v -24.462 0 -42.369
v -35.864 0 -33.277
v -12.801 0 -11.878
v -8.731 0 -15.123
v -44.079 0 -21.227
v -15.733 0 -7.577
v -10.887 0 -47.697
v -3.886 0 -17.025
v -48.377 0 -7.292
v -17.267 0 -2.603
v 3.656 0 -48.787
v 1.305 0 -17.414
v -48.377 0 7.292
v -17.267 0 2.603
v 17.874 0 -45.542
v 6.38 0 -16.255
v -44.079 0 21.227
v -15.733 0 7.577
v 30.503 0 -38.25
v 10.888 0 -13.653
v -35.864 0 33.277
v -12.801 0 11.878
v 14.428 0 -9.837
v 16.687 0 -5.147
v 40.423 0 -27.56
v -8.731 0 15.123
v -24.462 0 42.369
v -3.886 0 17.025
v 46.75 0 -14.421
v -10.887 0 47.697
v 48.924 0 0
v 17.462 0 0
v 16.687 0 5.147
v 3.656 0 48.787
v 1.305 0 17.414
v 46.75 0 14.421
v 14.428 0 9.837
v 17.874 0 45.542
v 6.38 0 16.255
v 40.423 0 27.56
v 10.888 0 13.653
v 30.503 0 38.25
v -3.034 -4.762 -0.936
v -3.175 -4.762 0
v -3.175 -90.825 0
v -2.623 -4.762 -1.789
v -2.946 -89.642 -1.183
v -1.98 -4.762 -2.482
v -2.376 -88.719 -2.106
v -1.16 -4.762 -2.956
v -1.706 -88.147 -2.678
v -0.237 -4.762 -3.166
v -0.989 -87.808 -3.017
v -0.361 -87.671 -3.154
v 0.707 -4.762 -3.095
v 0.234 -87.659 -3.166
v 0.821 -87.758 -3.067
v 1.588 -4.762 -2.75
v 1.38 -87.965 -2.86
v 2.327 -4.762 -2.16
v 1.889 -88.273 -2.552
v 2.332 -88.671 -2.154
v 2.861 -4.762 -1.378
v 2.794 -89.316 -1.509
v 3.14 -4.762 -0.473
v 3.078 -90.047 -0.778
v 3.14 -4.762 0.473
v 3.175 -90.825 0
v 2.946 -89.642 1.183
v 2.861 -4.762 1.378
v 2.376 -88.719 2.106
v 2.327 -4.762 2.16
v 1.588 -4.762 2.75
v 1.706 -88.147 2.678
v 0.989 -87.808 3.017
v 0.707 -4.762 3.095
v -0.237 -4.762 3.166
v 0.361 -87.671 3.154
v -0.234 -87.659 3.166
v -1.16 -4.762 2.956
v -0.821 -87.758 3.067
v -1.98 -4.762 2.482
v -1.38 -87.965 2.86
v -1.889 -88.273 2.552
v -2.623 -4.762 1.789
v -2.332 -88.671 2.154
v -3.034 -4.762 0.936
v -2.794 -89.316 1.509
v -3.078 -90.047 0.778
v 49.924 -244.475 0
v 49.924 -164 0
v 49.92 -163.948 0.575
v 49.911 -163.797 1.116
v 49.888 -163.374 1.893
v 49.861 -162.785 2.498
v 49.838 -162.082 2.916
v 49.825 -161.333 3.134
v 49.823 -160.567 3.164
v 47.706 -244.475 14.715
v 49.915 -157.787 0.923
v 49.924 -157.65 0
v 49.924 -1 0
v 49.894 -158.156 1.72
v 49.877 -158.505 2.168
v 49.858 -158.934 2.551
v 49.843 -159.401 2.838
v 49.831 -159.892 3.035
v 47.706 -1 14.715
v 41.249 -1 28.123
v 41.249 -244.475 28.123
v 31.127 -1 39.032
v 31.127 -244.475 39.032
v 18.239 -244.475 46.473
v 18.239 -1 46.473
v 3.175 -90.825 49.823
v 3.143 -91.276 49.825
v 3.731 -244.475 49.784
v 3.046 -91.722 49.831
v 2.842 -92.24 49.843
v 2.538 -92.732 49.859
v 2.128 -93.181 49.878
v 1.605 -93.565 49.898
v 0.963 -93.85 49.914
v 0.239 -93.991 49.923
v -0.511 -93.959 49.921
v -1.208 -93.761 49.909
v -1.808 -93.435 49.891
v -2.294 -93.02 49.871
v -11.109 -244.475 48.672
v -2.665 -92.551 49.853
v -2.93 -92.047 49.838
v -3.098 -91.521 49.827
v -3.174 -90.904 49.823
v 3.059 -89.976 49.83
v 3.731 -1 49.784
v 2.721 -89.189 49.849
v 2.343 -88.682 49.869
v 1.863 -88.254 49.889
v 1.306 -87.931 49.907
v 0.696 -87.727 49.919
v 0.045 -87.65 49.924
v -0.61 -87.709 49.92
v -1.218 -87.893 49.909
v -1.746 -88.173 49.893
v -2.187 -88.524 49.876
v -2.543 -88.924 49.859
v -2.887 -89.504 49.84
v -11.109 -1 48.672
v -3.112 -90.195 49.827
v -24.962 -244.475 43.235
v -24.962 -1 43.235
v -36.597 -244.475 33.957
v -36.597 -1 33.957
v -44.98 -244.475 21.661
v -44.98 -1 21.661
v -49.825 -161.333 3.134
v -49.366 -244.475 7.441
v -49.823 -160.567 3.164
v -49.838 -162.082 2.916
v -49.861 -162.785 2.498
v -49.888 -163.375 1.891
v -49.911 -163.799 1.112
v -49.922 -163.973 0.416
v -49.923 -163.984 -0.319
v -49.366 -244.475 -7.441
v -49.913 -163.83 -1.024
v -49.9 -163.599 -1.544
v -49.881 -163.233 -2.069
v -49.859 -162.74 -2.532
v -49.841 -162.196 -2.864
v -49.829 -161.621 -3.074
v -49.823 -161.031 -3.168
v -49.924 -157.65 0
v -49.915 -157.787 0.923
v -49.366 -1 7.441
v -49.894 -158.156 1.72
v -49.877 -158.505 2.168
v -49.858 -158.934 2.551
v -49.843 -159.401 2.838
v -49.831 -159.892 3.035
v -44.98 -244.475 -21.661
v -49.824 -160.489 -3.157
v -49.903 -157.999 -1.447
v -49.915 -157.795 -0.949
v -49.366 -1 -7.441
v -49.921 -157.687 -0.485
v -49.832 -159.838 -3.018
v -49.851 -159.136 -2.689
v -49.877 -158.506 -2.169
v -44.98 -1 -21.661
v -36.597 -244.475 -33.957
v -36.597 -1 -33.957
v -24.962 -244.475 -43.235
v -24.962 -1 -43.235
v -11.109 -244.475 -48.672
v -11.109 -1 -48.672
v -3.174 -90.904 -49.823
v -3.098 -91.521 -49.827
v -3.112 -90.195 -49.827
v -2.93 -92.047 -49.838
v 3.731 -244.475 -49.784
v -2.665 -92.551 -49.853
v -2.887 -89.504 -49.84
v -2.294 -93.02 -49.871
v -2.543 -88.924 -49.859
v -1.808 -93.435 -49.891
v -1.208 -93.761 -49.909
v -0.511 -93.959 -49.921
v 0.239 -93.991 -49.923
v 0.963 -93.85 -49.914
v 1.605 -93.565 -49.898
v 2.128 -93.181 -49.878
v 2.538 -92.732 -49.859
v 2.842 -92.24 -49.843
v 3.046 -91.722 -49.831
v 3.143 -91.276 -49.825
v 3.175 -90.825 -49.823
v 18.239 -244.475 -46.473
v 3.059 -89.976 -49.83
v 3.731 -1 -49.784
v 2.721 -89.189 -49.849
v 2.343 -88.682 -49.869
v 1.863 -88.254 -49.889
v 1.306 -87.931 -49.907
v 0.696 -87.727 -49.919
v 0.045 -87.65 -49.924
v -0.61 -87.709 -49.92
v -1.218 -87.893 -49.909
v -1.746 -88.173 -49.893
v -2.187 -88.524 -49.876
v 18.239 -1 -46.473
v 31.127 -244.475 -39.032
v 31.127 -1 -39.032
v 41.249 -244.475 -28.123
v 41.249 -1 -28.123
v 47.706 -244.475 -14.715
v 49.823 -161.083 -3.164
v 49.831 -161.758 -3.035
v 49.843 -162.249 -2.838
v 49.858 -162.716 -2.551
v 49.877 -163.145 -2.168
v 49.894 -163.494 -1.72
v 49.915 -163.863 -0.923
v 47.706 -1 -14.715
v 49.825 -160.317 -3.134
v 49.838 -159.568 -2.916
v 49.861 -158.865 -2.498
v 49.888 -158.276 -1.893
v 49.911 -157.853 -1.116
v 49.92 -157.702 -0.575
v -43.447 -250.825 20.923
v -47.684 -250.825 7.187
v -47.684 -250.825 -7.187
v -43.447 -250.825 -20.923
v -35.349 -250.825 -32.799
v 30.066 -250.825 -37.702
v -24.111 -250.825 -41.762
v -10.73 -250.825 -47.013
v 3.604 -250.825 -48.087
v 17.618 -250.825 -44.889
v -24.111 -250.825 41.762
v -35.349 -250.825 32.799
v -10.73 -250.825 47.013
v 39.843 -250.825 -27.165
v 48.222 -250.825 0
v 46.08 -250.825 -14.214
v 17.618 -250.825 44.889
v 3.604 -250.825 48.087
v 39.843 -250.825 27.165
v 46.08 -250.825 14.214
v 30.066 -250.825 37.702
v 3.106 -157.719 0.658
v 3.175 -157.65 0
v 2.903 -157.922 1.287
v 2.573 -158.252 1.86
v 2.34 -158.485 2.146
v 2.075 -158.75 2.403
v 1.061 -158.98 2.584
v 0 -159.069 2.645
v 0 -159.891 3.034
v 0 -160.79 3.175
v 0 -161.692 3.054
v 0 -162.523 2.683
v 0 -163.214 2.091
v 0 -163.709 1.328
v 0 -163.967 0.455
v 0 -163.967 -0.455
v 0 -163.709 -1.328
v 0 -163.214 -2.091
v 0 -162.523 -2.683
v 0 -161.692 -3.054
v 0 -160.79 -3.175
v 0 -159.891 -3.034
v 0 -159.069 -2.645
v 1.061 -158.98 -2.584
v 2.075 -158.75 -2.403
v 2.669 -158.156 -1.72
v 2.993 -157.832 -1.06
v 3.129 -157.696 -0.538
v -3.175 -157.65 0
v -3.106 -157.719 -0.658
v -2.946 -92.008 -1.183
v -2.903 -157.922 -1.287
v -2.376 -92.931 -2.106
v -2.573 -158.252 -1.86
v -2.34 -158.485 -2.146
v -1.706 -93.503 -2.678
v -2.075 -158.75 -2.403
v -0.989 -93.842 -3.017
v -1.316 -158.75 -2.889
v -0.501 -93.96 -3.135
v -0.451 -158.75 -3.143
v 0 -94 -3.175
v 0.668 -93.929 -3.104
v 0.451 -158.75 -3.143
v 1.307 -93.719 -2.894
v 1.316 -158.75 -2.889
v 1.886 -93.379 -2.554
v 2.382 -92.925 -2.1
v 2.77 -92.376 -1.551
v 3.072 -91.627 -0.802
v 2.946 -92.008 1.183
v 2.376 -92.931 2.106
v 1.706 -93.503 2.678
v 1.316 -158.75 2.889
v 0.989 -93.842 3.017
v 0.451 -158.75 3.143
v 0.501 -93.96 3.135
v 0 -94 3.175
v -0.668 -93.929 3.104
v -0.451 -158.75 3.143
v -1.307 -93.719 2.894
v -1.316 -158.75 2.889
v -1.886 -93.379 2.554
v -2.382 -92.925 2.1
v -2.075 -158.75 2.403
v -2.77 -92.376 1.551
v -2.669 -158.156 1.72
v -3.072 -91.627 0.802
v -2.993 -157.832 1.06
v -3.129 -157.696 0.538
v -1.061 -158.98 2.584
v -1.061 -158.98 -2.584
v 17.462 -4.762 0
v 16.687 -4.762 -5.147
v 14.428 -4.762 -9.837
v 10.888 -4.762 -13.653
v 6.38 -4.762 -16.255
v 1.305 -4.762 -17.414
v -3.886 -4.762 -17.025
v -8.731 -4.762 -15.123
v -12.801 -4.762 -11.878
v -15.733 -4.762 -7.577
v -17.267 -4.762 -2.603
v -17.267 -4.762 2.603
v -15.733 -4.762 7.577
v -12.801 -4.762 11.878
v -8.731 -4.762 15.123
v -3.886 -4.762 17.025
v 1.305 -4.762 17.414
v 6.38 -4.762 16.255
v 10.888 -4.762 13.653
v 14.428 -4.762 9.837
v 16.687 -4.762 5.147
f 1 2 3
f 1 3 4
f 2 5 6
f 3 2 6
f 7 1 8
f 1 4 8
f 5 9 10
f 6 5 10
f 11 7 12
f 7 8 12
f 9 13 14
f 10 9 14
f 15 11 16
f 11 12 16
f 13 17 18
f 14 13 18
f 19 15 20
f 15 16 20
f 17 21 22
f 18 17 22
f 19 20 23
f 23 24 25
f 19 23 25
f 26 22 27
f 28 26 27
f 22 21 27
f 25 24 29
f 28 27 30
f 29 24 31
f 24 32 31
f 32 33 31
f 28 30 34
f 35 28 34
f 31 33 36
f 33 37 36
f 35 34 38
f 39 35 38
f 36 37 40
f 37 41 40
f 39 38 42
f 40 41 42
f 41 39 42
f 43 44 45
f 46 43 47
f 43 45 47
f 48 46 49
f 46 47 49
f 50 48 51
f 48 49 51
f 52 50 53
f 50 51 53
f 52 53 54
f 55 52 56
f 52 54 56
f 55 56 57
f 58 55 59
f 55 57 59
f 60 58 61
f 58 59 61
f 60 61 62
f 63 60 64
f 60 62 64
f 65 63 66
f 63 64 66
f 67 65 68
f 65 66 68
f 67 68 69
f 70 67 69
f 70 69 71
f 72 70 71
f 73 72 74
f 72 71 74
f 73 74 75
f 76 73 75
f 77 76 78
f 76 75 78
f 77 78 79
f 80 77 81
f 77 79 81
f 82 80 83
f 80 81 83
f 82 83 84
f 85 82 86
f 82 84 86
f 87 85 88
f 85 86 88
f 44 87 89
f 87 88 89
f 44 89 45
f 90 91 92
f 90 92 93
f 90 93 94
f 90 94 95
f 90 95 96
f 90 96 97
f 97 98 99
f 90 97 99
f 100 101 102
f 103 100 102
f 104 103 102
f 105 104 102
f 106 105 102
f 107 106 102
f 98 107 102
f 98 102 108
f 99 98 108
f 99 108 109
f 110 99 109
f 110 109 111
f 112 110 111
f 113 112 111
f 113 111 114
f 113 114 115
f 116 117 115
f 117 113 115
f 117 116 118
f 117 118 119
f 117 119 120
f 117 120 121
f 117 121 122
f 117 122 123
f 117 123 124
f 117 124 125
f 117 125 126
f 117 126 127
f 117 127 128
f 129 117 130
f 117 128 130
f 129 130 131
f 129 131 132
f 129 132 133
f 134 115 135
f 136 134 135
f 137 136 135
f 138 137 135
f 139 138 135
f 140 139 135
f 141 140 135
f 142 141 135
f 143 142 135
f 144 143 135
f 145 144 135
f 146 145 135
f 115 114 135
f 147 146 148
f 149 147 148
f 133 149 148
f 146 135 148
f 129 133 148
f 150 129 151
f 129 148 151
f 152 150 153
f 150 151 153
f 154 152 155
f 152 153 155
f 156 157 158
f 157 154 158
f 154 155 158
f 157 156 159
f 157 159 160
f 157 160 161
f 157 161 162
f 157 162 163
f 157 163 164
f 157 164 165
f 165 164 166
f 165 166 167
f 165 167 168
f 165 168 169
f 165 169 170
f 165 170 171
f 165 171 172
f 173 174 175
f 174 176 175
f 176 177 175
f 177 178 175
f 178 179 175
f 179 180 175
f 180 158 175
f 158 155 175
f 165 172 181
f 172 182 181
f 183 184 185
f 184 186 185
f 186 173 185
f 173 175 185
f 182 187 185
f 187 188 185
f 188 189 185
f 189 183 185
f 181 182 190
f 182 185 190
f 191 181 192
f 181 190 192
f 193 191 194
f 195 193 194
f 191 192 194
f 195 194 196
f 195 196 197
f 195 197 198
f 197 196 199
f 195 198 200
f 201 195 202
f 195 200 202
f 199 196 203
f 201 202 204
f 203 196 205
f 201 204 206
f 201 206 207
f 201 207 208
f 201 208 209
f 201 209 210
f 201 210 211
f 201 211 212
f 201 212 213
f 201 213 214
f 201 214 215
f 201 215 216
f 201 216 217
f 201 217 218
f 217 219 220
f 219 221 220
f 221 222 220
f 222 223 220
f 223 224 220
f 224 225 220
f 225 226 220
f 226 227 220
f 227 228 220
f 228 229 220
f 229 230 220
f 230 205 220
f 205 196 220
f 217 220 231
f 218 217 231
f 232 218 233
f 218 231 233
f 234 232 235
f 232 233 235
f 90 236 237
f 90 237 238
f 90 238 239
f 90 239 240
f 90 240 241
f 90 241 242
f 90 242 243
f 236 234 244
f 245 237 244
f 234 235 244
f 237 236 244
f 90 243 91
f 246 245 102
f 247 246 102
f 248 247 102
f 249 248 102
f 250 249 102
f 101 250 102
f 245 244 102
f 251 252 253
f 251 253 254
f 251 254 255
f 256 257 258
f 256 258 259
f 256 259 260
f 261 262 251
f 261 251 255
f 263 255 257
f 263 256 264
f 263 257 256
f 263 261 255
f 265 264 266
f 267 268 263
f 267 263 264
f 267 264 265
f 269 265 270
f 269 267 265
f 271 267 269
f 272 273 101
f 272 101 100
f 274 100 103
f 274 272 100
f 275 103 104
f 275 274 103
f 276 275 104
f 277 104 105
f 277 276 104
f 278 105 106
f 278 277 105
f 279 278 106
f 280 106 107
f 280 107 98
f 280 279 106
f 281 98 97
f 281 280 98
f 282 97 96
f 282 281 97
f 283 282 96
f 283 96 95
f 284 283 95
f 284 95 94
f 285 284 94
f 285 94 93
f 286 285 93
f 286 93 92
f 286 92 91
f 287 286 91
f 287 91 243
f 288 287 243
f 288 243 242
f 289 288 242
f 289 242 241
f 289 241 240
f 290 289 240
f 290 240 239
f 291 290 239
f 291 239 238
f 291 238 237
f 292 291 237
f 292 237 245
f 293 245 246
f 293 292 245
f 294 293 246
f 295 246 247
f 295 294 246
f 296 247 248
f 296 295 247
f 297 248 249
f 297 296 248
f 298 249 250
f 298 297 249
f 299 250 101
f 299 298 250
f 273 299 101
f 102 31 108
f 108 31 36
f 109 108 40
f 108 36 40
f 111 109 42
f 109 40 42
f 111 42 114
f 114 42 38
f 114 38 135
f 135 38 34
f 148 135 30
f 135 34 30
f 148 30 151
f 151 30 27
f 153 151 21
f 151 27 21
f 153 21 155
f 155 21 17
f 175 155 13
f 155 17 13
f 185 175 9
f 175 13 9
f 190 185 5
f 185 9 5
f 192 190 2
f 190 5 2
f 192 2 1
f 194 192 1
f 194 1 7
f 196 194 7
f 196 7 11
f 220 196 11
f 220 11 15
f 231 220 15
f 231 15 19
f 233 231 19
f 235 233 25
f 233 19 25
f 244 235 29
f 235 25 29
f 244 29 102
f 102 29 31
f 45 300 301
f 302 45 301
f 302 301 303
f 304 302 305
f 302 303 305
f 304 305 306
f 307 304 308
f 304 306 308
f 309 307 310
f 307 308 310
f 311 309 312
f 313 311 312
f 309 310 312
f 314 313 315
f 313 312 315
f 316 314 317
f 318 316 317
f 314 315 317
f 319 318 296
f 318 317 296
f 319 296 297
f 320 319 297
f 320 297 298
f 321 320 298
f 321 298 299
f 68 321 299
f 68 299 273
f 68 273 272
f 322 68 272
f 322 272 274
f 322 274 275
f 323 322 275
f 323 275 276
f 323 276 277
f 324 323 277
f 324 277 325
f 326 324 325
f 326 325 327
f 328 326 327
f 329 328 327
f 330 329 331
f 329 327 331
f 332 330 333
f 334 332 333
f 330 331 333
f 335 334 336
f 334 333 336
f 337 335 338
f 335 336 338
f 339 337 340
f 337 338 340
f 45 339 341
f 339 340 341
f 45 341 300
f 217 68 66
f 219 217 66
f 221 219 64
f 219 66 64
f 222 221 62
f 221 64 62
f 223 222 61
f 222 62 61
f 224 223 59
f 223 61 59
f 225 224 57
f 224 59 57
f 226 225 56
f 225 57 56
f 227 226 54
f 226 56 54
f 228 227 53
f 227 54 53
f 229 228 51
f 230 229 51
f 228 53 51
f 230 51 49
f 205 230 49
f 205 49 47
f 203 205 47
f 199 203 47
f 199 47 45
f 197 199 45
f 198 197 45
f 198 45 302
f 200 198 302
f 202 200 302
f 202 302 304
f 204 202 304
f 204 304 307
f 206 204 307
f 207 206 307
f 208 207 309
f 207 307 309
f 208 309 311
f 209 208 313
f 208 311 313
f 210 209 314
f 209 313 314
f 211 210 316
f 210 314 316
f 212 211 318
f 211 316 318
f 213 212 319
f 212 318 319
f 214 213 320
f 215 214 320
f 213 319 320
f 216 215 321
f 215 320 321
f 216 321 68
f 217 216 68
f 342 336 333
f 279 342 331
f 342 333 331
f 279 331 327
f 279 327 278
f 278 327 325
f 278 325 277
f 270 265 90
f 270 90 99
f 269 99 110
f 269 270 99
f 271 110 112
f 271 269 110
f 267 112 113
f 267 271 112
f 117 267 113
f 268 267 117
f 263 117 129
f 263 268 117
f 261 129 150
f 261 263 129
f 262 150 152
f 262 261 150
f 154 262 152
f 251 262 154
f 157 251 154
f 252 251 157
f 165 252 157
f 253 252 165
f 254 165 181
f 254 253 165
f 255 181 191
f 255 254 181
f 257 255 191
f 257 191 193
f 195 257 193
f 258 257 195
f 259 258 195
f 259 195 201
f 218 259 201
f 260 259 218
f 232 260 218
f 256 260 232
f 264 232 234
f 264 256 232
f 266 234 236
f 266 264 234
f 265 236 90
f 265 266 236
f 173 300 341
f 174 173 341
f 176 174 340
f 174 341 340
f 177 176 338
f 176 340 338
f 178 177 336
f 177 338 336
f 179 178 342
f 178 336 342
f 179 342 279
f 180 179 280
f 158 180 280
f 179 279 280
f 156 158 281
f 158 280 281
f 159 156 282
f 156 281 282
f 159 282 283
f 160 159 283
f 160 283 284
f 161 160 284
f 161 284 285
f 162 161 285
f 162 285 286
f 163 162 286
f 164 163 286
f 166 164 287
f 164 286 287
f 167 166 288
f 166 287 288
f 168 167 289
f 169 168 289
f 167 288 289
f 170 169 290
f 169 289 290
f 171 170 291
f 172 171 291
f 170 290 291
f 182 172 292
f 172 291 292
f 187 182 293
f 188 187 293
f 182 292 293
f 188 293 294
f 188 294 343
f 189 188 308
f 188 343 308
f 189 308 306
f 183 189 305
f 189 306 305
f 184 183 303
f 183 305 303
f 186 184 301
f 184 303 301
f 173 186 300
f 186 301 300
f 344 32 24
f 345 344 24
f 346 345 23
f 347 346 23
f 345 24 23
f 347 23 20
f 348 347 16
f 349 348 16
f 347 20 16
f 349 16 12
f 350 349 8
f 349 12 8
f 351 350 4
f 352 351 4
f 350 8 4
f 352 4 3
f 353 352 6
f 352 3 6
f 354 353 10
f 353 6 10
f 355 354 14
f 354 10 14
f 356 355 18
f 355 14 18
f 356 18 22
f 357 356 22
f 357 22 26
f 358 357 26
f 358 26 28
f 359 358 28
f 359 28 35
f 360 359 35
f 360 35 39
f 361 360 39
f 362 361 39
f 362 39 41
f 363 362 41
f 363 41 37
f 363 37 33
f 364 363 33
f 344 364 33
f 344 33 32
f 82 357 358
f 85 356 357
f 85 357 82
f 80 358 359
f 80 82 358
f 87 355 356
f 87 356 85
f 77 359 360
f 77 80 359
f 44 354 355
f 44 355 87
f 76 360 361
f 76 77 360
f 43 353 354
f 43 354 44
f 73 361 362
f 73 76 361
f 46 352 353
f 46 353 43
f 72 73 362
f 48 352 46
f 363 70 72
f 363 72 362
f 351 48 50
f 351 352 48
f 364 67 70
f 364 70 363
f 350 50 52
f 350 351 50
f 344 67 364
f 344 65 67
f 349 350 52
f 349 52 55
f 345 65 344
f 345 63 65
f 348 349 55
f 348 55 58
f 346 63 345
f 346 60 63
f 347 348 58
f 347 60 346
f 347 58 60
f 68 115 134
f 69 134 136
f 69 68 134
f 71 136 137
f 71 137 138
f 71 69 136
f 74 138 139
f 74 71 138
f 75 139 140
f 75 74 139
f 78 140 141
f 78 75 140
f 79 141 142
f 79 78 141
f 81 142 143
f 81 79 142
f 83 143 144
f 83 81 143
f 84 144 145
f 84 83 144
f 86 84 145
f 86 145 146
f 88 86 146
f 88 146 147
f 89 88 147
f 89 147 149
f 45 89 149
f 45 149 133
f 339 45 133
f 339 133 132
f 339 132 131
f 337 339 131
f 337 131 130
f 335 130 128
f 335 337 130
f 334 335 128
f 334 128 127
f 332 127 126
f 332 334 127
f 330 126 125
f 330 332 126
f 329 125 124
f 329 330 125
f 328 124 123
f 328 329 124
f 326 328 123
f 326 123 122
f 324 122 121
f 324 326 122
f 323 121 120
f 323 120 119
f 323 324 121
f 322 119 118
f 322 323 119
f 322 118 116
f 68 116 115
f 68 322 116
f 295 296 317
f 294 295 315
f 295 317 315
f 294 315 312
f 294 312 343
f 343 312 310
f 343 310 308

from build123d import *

# Parameters (mm, degrees)
F0_R           = 49.9237
F1_DEPTH       = 250.825
F2_SIZE2       = 1.7014773719
F2_SIZE        = 6.35
F4_D           = 6.35
F4_DEPTH       = 158.75
F4_CBORE_D     = 34.925
F4_CBORE_DEPTH = 4.7625
F4_TIP         = 1.9077324654
F5_R           = 3.175
F6_DEPTH       = 49.9247
F6_DEPTH_BACK  = 49.9247
F7_R           = 3.175
F8_DEPTH       = 49.9247001
F8_DEPTH_BACK  = 49.9247001
F9_SIZE        = 1


with BuildPart() as f1:
    # F0 (on Front) → F1 (new body)
    with BuildSketch(Plane.XZ):
        Circle(F0_R)
    extrude(amount=F1_DEPTH)

    # F2
    f2_edges = [f1.edges().sort_by_distance(p)[0] for p in [
        (-49.9237, -250.825, 0),
    ]]
    f2_side = f1.faces().sort_by_distance((-49.9237, -125.4125, 0))[0]
    chamfer(f2_edges, length=F2_SIZE, length2=F2_SIZE2, reference=f2_side)

    # F4
    with Locations(Plane(origin=(0, 0, 0), x_dir=(1, 0, 0), z_dir=(0, 1, 0))):
        with Locations((0, 0)):
            CounterBoreHole(F4_D / 2, F4_CBORE_D / 2, F4_CBORE_DEPTH, depth=F4_DEPTH)
            with Locations((0, 0, -(F4_DEPTH + F4_TIP / 2))):  # 118° drill point
                Cone(0, F4_D / 2, F4_TIP, mode=Mode.SUBTRACT)

    # F5 (on Right) → F6 (cut, two sides)
    with BuildSketch(Plane.YZ) as f6_sk:
        with Locations((-160.825, 0)):
            Circle(F5_R)
    extrude(amount=-F6_DEPTH, mode=Mode.SUBTRACT)
    extrude(f6_sk.sketch, amount=F6_DEPTH_BACK, mode=Mode.SUBTRACT)

    # F7 (on Top) → F8 (cut, two sides)
    with BuildSketch(Plane.XY) as f8_sk:
        with Locations((0, -90.825)):
            Circle(F7_R)
    extrude(amount=-F8_DEPTH, mode=Mode.SUBTRACT)
    extrude(f8_sk.sketch, amount=F8_DEPTH_BACK, mode=Mode.SUBTRACT)

    # F9
    f9_edges = [f1.edges().sort_by_distance(p)[0] for p in [
        (-49.9237, 0, 0),
    ]]
    chamfer(f9_edges, length=F9_SIZE)


solid = f1.part
